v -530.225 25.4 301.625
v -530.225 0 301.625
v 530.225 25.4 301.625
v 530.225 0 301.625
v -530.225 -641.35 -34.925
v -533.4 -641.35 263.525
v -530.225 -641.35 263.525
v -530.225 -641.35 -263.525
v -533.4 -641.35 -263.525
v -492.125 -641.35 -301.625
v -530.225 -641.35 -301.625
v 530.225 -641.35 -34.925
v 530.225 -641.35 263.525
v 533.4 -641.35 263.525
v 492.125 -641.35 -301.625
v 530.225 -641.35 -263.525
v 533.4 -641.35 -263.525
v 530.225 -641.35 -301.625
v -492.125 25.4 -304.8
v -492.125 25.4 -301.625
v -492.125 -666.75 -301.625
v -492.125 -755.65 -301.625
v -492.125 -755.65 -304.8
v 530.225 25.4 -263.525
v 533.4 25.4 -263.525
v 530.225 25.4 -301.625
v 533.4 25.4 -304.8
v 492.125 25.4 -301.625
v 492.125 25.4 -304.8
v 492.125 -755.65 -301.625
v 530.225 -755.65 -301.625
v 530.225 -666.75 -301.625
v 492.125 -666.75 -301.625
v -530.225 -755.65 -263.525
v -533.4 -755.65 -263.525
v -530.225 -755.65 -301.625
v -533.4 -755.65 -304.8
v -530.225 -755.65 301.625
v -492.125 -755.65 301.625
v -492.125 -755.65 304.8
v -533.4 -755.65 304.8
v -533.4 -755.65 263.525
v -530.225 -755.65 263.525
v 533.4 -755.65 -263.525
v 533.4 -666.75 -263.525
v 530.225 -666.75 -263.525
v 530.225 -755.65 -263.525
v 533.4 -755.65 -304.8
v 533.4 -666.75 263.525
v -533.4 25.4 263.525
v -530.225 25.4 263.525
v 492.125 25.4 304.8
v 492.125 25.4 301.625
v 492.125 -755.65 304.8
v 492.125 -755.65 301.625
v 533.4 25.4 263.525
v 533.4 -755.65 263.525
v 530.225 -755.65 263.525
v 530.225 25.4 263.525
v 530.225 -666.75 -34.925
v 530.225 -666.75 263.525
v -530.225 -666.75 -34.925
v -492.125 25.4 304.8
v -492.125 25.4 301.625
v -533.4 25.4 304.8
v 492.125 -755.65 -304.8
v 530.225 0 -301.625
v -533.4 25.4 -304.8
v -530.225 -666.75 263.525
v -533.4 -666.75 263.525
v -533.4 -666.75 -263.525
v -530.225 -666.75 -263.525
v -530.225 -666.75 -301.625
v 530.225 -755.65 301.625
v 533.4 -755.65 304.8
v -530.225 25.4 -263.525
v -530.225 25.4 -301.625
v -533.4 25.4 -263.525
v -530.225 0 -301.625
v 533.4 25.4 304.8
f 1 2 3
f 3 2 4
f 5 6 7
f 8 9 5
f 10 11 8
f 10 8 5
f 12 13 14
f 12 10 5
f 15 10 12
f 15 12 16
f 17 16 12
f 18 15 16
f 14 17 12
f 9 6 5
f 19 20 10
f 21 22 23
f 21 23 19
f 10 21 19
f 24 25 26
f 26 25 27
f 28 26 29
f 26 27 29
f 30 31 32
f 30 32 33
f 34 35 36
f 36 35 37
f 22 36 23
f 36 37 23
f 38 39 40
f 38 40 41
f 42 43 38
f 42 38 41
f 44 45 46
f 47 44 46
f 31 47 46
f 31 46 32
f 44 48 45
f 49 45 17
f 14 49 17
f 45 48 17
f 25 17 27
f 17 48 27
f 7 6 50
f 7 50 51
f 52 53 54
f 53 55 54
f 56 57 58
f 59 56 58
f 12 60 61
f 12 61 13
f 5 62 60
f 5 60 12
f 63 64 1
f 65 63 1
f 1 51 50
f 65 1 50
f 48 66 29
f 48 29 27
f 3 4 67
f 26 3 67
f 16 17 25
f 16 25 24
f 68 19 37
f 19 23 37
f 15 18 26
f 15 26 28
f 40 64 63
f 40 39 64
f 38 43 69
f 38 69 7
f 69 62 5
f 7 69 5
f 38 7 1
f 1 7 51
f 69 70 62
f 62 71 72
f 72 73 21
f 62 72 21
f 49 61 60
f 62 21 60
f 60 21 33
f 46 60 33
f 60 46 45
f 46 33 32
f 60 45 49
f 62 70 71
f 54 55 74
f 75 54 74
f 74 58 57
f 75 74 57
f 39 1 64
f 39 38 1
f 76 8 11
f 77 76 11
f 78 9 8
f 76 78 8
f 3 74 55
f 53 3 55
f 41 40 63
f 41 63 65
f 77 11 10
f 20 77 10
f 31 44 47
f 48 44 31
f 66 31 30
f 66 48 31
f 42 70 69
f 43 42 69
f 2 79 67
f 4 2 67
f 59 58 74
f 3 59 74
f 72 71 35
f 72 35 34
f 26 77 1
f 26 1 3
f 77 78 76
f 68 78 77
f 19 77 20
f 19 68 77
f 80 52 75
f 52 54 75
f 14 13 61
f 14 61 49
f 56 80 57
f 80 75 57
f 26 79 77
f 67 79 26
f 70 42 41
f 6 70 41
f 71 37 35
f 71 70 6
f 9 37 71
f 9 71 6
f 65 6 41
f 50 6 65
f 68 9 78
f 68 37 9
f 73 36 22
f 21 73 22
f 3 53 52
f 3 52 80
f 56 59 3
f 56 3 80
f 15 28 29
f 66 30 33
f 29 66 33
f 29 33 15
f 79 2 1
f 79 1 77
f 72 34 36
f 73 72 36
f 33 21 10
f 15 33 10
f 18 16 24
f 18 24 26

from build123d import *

# Parameters (mm, degrees)
SKETCH1_W                  = 1060.45
SKETCH1_H                  = 603.25
BOSS_EXTRUDE1_DEPTH        = 25.4
BOSS_EXTRUDE2_DEPTH        = 755.65
BOSS_EXTRUDE2_DEPTH_BACK   = 25.4
BOSS_EXTRUDE2_2_DEPTH      = 755.65
BOSS_EXTRUDE2_2_DEPTH_BACK = 25.4
BOSS_EXTRUDE2_3_DEPTH      = 755.65
BOSS_EXTRUDE2_3_DEPTH_BACK = 25.4
BOSS_EXTRUDE2_4_DEPTH      = 755.65
BOSS_EXTRUDE2_4_DEPTH_BACK = 25.4
SKETCH3_W                  = 266.7
SKETCH3_H                  = 25.4
BOSS_EXTRUDE3_DEPTH        = 1060.45
SKETCH4_W                  = 3.175
SKETCH4_H                  = 25.4
BOSS_EXTRUDE4_DEPTH        = 527.05


with BuildPart() as part:
    # Sketch1 → Boss-Extrude1 (new body)
    with BuildSketch(Plane(origin=(0, 0, 0), x_dir=(1, 0, 0), z_dir=(0, 1, 0))):
        Rectangle(SKETCH1_W, SKETCH1_H)
    extrude(amount=BOSS_EXTRUDE1_DEPTH)


with BuildPart() as body_2:
    # Sketch2 → Boss-Extrude2 (new body, two sides)
    with BuildSketch(Plane(origin=(0, 0, 0), x_dir=(-1, 0, 0), z_dir=(0, -1, 0))) as boss_extrude2_sk:
        Polygon((492.125, -301.625), (492.125, -304.8), (533.4, -304.8), (533.4, -263.525), (530.225, -263.525), (530.225, -301.625), align=None)
    extrude(amount=BOSS_EXTRUDE2_DEPTH)
    extrude(boss_extrude2_sk.sketch, amount=-BOSS_EXTRUDE2_DEPTH_BACK)



with BuildPart() as body_3:
    # Sketch2 → Boss-Extrude2 2 (new body, two sides)
    with BuildSketch(Plane(origin=(0, 0, 0), x_dir=(-1, 0, 0), z_dir=(0, -1, 0))) as boss_extrude2_2_sk:
        Polygon((-530.225, -301.625), (-492.125, -301.625), (-492.125, -304.8), (-533.4, -304.8), (-533.4, -263.525), (-530.225, -263.525), align=None)
    extrude(amount=BOSS_EXTRUDE2_2_DEPTH)
    extrude(boss_extrude2_2_sk.sketch, amount=-BOSS_EXTRUDE2_2_DEPTH_BACK)


with BuildPart() as body_4:
    # Sketch2 → Boss-Extrude2 3 (new body, two sides)
    with BuildSketch(Plane(origin=(0, 0, 0), x_dir=(-1, 0, 0), z_dir=(0, -1, 0))) as boss_extrude2_3_sk:
        Polygon((-492.125, 301.625), (-492.125, 304.8), (-533.4, 304.8), (-533.4, 263.525), (-530.225, 263.525), (-530.225, 301.625), align=None)
    extrude(amount=BOSS_EXTRUDE2_3_DEPTH)
    extrude(boss_extrude2_3_sk.sketch, amount=-BOSS_EXTRUDE2_3_DEPTH_BACK)

    # Sketch3 → Boss-Extrude3 (add)
    with BuildSketch(Plane.ZY.offset(-530.225)):
        with Locations((-168.275, -654.05)):
            Rectangle(SKETCH3_W, SKETCH3_H)
    extrude(amount=BOSS_EXTRUDE3_DEPTH)


with BuildPart() as body_5:
    # Sketch2 → Boss-Extrude2 4 (new body, two sides)
    with BuildSketch(Plane(origin=(0, 0, 0), x_dir=(-1, 0, 0), z_dir=(0, -1, 0))) as boss_extrude2_4_sk:
        Polygon((530.225, 301.625), (492.125, 301.625), (492.125, 304.8), (533.4, 304.8), (533.4, 263.525), (530.225, 263.525), align=None)
    extrude(amount=BOSS_EXTRUDE2_4_DEPTH)
    extrude(boss_extrude2_4_sk.sketch, amount=-BOSS_EXTRUDE2_4_DEPTH_BACK)


with BuildPart() as body_2_1:
    add(body_2.part)

    add(body_4.part)  # Boss-Extrude4 merges body 4

    add(body_5.part)  # Boss-Extrude4 merges body 5
    # Sketch4 → Boss-Extrude4 (add)
    with BuildSketch(Plane(origin=(0, 0, -263.525), x_dir=(-1, 0, 0), z_dir=(0, 0, -1))):
        with Locations((531.8125, -654.05)):
            Rectangle(SKETCH4_W, SKETCH4_H)
    boss_extrude4 = extrude(amount=-BOSS_EXTRUDE4_DEPTH)

    # Mirror2: Boss-Extrude4 across plane
    add(boss_extrude4.mirror(Plane(origin=(0, 0, 0), x_dir=(0, 0, 1), z_dir=(1, 0, 0))))


solid = Compound([part.part, body_3.part, body_2_1.part])
